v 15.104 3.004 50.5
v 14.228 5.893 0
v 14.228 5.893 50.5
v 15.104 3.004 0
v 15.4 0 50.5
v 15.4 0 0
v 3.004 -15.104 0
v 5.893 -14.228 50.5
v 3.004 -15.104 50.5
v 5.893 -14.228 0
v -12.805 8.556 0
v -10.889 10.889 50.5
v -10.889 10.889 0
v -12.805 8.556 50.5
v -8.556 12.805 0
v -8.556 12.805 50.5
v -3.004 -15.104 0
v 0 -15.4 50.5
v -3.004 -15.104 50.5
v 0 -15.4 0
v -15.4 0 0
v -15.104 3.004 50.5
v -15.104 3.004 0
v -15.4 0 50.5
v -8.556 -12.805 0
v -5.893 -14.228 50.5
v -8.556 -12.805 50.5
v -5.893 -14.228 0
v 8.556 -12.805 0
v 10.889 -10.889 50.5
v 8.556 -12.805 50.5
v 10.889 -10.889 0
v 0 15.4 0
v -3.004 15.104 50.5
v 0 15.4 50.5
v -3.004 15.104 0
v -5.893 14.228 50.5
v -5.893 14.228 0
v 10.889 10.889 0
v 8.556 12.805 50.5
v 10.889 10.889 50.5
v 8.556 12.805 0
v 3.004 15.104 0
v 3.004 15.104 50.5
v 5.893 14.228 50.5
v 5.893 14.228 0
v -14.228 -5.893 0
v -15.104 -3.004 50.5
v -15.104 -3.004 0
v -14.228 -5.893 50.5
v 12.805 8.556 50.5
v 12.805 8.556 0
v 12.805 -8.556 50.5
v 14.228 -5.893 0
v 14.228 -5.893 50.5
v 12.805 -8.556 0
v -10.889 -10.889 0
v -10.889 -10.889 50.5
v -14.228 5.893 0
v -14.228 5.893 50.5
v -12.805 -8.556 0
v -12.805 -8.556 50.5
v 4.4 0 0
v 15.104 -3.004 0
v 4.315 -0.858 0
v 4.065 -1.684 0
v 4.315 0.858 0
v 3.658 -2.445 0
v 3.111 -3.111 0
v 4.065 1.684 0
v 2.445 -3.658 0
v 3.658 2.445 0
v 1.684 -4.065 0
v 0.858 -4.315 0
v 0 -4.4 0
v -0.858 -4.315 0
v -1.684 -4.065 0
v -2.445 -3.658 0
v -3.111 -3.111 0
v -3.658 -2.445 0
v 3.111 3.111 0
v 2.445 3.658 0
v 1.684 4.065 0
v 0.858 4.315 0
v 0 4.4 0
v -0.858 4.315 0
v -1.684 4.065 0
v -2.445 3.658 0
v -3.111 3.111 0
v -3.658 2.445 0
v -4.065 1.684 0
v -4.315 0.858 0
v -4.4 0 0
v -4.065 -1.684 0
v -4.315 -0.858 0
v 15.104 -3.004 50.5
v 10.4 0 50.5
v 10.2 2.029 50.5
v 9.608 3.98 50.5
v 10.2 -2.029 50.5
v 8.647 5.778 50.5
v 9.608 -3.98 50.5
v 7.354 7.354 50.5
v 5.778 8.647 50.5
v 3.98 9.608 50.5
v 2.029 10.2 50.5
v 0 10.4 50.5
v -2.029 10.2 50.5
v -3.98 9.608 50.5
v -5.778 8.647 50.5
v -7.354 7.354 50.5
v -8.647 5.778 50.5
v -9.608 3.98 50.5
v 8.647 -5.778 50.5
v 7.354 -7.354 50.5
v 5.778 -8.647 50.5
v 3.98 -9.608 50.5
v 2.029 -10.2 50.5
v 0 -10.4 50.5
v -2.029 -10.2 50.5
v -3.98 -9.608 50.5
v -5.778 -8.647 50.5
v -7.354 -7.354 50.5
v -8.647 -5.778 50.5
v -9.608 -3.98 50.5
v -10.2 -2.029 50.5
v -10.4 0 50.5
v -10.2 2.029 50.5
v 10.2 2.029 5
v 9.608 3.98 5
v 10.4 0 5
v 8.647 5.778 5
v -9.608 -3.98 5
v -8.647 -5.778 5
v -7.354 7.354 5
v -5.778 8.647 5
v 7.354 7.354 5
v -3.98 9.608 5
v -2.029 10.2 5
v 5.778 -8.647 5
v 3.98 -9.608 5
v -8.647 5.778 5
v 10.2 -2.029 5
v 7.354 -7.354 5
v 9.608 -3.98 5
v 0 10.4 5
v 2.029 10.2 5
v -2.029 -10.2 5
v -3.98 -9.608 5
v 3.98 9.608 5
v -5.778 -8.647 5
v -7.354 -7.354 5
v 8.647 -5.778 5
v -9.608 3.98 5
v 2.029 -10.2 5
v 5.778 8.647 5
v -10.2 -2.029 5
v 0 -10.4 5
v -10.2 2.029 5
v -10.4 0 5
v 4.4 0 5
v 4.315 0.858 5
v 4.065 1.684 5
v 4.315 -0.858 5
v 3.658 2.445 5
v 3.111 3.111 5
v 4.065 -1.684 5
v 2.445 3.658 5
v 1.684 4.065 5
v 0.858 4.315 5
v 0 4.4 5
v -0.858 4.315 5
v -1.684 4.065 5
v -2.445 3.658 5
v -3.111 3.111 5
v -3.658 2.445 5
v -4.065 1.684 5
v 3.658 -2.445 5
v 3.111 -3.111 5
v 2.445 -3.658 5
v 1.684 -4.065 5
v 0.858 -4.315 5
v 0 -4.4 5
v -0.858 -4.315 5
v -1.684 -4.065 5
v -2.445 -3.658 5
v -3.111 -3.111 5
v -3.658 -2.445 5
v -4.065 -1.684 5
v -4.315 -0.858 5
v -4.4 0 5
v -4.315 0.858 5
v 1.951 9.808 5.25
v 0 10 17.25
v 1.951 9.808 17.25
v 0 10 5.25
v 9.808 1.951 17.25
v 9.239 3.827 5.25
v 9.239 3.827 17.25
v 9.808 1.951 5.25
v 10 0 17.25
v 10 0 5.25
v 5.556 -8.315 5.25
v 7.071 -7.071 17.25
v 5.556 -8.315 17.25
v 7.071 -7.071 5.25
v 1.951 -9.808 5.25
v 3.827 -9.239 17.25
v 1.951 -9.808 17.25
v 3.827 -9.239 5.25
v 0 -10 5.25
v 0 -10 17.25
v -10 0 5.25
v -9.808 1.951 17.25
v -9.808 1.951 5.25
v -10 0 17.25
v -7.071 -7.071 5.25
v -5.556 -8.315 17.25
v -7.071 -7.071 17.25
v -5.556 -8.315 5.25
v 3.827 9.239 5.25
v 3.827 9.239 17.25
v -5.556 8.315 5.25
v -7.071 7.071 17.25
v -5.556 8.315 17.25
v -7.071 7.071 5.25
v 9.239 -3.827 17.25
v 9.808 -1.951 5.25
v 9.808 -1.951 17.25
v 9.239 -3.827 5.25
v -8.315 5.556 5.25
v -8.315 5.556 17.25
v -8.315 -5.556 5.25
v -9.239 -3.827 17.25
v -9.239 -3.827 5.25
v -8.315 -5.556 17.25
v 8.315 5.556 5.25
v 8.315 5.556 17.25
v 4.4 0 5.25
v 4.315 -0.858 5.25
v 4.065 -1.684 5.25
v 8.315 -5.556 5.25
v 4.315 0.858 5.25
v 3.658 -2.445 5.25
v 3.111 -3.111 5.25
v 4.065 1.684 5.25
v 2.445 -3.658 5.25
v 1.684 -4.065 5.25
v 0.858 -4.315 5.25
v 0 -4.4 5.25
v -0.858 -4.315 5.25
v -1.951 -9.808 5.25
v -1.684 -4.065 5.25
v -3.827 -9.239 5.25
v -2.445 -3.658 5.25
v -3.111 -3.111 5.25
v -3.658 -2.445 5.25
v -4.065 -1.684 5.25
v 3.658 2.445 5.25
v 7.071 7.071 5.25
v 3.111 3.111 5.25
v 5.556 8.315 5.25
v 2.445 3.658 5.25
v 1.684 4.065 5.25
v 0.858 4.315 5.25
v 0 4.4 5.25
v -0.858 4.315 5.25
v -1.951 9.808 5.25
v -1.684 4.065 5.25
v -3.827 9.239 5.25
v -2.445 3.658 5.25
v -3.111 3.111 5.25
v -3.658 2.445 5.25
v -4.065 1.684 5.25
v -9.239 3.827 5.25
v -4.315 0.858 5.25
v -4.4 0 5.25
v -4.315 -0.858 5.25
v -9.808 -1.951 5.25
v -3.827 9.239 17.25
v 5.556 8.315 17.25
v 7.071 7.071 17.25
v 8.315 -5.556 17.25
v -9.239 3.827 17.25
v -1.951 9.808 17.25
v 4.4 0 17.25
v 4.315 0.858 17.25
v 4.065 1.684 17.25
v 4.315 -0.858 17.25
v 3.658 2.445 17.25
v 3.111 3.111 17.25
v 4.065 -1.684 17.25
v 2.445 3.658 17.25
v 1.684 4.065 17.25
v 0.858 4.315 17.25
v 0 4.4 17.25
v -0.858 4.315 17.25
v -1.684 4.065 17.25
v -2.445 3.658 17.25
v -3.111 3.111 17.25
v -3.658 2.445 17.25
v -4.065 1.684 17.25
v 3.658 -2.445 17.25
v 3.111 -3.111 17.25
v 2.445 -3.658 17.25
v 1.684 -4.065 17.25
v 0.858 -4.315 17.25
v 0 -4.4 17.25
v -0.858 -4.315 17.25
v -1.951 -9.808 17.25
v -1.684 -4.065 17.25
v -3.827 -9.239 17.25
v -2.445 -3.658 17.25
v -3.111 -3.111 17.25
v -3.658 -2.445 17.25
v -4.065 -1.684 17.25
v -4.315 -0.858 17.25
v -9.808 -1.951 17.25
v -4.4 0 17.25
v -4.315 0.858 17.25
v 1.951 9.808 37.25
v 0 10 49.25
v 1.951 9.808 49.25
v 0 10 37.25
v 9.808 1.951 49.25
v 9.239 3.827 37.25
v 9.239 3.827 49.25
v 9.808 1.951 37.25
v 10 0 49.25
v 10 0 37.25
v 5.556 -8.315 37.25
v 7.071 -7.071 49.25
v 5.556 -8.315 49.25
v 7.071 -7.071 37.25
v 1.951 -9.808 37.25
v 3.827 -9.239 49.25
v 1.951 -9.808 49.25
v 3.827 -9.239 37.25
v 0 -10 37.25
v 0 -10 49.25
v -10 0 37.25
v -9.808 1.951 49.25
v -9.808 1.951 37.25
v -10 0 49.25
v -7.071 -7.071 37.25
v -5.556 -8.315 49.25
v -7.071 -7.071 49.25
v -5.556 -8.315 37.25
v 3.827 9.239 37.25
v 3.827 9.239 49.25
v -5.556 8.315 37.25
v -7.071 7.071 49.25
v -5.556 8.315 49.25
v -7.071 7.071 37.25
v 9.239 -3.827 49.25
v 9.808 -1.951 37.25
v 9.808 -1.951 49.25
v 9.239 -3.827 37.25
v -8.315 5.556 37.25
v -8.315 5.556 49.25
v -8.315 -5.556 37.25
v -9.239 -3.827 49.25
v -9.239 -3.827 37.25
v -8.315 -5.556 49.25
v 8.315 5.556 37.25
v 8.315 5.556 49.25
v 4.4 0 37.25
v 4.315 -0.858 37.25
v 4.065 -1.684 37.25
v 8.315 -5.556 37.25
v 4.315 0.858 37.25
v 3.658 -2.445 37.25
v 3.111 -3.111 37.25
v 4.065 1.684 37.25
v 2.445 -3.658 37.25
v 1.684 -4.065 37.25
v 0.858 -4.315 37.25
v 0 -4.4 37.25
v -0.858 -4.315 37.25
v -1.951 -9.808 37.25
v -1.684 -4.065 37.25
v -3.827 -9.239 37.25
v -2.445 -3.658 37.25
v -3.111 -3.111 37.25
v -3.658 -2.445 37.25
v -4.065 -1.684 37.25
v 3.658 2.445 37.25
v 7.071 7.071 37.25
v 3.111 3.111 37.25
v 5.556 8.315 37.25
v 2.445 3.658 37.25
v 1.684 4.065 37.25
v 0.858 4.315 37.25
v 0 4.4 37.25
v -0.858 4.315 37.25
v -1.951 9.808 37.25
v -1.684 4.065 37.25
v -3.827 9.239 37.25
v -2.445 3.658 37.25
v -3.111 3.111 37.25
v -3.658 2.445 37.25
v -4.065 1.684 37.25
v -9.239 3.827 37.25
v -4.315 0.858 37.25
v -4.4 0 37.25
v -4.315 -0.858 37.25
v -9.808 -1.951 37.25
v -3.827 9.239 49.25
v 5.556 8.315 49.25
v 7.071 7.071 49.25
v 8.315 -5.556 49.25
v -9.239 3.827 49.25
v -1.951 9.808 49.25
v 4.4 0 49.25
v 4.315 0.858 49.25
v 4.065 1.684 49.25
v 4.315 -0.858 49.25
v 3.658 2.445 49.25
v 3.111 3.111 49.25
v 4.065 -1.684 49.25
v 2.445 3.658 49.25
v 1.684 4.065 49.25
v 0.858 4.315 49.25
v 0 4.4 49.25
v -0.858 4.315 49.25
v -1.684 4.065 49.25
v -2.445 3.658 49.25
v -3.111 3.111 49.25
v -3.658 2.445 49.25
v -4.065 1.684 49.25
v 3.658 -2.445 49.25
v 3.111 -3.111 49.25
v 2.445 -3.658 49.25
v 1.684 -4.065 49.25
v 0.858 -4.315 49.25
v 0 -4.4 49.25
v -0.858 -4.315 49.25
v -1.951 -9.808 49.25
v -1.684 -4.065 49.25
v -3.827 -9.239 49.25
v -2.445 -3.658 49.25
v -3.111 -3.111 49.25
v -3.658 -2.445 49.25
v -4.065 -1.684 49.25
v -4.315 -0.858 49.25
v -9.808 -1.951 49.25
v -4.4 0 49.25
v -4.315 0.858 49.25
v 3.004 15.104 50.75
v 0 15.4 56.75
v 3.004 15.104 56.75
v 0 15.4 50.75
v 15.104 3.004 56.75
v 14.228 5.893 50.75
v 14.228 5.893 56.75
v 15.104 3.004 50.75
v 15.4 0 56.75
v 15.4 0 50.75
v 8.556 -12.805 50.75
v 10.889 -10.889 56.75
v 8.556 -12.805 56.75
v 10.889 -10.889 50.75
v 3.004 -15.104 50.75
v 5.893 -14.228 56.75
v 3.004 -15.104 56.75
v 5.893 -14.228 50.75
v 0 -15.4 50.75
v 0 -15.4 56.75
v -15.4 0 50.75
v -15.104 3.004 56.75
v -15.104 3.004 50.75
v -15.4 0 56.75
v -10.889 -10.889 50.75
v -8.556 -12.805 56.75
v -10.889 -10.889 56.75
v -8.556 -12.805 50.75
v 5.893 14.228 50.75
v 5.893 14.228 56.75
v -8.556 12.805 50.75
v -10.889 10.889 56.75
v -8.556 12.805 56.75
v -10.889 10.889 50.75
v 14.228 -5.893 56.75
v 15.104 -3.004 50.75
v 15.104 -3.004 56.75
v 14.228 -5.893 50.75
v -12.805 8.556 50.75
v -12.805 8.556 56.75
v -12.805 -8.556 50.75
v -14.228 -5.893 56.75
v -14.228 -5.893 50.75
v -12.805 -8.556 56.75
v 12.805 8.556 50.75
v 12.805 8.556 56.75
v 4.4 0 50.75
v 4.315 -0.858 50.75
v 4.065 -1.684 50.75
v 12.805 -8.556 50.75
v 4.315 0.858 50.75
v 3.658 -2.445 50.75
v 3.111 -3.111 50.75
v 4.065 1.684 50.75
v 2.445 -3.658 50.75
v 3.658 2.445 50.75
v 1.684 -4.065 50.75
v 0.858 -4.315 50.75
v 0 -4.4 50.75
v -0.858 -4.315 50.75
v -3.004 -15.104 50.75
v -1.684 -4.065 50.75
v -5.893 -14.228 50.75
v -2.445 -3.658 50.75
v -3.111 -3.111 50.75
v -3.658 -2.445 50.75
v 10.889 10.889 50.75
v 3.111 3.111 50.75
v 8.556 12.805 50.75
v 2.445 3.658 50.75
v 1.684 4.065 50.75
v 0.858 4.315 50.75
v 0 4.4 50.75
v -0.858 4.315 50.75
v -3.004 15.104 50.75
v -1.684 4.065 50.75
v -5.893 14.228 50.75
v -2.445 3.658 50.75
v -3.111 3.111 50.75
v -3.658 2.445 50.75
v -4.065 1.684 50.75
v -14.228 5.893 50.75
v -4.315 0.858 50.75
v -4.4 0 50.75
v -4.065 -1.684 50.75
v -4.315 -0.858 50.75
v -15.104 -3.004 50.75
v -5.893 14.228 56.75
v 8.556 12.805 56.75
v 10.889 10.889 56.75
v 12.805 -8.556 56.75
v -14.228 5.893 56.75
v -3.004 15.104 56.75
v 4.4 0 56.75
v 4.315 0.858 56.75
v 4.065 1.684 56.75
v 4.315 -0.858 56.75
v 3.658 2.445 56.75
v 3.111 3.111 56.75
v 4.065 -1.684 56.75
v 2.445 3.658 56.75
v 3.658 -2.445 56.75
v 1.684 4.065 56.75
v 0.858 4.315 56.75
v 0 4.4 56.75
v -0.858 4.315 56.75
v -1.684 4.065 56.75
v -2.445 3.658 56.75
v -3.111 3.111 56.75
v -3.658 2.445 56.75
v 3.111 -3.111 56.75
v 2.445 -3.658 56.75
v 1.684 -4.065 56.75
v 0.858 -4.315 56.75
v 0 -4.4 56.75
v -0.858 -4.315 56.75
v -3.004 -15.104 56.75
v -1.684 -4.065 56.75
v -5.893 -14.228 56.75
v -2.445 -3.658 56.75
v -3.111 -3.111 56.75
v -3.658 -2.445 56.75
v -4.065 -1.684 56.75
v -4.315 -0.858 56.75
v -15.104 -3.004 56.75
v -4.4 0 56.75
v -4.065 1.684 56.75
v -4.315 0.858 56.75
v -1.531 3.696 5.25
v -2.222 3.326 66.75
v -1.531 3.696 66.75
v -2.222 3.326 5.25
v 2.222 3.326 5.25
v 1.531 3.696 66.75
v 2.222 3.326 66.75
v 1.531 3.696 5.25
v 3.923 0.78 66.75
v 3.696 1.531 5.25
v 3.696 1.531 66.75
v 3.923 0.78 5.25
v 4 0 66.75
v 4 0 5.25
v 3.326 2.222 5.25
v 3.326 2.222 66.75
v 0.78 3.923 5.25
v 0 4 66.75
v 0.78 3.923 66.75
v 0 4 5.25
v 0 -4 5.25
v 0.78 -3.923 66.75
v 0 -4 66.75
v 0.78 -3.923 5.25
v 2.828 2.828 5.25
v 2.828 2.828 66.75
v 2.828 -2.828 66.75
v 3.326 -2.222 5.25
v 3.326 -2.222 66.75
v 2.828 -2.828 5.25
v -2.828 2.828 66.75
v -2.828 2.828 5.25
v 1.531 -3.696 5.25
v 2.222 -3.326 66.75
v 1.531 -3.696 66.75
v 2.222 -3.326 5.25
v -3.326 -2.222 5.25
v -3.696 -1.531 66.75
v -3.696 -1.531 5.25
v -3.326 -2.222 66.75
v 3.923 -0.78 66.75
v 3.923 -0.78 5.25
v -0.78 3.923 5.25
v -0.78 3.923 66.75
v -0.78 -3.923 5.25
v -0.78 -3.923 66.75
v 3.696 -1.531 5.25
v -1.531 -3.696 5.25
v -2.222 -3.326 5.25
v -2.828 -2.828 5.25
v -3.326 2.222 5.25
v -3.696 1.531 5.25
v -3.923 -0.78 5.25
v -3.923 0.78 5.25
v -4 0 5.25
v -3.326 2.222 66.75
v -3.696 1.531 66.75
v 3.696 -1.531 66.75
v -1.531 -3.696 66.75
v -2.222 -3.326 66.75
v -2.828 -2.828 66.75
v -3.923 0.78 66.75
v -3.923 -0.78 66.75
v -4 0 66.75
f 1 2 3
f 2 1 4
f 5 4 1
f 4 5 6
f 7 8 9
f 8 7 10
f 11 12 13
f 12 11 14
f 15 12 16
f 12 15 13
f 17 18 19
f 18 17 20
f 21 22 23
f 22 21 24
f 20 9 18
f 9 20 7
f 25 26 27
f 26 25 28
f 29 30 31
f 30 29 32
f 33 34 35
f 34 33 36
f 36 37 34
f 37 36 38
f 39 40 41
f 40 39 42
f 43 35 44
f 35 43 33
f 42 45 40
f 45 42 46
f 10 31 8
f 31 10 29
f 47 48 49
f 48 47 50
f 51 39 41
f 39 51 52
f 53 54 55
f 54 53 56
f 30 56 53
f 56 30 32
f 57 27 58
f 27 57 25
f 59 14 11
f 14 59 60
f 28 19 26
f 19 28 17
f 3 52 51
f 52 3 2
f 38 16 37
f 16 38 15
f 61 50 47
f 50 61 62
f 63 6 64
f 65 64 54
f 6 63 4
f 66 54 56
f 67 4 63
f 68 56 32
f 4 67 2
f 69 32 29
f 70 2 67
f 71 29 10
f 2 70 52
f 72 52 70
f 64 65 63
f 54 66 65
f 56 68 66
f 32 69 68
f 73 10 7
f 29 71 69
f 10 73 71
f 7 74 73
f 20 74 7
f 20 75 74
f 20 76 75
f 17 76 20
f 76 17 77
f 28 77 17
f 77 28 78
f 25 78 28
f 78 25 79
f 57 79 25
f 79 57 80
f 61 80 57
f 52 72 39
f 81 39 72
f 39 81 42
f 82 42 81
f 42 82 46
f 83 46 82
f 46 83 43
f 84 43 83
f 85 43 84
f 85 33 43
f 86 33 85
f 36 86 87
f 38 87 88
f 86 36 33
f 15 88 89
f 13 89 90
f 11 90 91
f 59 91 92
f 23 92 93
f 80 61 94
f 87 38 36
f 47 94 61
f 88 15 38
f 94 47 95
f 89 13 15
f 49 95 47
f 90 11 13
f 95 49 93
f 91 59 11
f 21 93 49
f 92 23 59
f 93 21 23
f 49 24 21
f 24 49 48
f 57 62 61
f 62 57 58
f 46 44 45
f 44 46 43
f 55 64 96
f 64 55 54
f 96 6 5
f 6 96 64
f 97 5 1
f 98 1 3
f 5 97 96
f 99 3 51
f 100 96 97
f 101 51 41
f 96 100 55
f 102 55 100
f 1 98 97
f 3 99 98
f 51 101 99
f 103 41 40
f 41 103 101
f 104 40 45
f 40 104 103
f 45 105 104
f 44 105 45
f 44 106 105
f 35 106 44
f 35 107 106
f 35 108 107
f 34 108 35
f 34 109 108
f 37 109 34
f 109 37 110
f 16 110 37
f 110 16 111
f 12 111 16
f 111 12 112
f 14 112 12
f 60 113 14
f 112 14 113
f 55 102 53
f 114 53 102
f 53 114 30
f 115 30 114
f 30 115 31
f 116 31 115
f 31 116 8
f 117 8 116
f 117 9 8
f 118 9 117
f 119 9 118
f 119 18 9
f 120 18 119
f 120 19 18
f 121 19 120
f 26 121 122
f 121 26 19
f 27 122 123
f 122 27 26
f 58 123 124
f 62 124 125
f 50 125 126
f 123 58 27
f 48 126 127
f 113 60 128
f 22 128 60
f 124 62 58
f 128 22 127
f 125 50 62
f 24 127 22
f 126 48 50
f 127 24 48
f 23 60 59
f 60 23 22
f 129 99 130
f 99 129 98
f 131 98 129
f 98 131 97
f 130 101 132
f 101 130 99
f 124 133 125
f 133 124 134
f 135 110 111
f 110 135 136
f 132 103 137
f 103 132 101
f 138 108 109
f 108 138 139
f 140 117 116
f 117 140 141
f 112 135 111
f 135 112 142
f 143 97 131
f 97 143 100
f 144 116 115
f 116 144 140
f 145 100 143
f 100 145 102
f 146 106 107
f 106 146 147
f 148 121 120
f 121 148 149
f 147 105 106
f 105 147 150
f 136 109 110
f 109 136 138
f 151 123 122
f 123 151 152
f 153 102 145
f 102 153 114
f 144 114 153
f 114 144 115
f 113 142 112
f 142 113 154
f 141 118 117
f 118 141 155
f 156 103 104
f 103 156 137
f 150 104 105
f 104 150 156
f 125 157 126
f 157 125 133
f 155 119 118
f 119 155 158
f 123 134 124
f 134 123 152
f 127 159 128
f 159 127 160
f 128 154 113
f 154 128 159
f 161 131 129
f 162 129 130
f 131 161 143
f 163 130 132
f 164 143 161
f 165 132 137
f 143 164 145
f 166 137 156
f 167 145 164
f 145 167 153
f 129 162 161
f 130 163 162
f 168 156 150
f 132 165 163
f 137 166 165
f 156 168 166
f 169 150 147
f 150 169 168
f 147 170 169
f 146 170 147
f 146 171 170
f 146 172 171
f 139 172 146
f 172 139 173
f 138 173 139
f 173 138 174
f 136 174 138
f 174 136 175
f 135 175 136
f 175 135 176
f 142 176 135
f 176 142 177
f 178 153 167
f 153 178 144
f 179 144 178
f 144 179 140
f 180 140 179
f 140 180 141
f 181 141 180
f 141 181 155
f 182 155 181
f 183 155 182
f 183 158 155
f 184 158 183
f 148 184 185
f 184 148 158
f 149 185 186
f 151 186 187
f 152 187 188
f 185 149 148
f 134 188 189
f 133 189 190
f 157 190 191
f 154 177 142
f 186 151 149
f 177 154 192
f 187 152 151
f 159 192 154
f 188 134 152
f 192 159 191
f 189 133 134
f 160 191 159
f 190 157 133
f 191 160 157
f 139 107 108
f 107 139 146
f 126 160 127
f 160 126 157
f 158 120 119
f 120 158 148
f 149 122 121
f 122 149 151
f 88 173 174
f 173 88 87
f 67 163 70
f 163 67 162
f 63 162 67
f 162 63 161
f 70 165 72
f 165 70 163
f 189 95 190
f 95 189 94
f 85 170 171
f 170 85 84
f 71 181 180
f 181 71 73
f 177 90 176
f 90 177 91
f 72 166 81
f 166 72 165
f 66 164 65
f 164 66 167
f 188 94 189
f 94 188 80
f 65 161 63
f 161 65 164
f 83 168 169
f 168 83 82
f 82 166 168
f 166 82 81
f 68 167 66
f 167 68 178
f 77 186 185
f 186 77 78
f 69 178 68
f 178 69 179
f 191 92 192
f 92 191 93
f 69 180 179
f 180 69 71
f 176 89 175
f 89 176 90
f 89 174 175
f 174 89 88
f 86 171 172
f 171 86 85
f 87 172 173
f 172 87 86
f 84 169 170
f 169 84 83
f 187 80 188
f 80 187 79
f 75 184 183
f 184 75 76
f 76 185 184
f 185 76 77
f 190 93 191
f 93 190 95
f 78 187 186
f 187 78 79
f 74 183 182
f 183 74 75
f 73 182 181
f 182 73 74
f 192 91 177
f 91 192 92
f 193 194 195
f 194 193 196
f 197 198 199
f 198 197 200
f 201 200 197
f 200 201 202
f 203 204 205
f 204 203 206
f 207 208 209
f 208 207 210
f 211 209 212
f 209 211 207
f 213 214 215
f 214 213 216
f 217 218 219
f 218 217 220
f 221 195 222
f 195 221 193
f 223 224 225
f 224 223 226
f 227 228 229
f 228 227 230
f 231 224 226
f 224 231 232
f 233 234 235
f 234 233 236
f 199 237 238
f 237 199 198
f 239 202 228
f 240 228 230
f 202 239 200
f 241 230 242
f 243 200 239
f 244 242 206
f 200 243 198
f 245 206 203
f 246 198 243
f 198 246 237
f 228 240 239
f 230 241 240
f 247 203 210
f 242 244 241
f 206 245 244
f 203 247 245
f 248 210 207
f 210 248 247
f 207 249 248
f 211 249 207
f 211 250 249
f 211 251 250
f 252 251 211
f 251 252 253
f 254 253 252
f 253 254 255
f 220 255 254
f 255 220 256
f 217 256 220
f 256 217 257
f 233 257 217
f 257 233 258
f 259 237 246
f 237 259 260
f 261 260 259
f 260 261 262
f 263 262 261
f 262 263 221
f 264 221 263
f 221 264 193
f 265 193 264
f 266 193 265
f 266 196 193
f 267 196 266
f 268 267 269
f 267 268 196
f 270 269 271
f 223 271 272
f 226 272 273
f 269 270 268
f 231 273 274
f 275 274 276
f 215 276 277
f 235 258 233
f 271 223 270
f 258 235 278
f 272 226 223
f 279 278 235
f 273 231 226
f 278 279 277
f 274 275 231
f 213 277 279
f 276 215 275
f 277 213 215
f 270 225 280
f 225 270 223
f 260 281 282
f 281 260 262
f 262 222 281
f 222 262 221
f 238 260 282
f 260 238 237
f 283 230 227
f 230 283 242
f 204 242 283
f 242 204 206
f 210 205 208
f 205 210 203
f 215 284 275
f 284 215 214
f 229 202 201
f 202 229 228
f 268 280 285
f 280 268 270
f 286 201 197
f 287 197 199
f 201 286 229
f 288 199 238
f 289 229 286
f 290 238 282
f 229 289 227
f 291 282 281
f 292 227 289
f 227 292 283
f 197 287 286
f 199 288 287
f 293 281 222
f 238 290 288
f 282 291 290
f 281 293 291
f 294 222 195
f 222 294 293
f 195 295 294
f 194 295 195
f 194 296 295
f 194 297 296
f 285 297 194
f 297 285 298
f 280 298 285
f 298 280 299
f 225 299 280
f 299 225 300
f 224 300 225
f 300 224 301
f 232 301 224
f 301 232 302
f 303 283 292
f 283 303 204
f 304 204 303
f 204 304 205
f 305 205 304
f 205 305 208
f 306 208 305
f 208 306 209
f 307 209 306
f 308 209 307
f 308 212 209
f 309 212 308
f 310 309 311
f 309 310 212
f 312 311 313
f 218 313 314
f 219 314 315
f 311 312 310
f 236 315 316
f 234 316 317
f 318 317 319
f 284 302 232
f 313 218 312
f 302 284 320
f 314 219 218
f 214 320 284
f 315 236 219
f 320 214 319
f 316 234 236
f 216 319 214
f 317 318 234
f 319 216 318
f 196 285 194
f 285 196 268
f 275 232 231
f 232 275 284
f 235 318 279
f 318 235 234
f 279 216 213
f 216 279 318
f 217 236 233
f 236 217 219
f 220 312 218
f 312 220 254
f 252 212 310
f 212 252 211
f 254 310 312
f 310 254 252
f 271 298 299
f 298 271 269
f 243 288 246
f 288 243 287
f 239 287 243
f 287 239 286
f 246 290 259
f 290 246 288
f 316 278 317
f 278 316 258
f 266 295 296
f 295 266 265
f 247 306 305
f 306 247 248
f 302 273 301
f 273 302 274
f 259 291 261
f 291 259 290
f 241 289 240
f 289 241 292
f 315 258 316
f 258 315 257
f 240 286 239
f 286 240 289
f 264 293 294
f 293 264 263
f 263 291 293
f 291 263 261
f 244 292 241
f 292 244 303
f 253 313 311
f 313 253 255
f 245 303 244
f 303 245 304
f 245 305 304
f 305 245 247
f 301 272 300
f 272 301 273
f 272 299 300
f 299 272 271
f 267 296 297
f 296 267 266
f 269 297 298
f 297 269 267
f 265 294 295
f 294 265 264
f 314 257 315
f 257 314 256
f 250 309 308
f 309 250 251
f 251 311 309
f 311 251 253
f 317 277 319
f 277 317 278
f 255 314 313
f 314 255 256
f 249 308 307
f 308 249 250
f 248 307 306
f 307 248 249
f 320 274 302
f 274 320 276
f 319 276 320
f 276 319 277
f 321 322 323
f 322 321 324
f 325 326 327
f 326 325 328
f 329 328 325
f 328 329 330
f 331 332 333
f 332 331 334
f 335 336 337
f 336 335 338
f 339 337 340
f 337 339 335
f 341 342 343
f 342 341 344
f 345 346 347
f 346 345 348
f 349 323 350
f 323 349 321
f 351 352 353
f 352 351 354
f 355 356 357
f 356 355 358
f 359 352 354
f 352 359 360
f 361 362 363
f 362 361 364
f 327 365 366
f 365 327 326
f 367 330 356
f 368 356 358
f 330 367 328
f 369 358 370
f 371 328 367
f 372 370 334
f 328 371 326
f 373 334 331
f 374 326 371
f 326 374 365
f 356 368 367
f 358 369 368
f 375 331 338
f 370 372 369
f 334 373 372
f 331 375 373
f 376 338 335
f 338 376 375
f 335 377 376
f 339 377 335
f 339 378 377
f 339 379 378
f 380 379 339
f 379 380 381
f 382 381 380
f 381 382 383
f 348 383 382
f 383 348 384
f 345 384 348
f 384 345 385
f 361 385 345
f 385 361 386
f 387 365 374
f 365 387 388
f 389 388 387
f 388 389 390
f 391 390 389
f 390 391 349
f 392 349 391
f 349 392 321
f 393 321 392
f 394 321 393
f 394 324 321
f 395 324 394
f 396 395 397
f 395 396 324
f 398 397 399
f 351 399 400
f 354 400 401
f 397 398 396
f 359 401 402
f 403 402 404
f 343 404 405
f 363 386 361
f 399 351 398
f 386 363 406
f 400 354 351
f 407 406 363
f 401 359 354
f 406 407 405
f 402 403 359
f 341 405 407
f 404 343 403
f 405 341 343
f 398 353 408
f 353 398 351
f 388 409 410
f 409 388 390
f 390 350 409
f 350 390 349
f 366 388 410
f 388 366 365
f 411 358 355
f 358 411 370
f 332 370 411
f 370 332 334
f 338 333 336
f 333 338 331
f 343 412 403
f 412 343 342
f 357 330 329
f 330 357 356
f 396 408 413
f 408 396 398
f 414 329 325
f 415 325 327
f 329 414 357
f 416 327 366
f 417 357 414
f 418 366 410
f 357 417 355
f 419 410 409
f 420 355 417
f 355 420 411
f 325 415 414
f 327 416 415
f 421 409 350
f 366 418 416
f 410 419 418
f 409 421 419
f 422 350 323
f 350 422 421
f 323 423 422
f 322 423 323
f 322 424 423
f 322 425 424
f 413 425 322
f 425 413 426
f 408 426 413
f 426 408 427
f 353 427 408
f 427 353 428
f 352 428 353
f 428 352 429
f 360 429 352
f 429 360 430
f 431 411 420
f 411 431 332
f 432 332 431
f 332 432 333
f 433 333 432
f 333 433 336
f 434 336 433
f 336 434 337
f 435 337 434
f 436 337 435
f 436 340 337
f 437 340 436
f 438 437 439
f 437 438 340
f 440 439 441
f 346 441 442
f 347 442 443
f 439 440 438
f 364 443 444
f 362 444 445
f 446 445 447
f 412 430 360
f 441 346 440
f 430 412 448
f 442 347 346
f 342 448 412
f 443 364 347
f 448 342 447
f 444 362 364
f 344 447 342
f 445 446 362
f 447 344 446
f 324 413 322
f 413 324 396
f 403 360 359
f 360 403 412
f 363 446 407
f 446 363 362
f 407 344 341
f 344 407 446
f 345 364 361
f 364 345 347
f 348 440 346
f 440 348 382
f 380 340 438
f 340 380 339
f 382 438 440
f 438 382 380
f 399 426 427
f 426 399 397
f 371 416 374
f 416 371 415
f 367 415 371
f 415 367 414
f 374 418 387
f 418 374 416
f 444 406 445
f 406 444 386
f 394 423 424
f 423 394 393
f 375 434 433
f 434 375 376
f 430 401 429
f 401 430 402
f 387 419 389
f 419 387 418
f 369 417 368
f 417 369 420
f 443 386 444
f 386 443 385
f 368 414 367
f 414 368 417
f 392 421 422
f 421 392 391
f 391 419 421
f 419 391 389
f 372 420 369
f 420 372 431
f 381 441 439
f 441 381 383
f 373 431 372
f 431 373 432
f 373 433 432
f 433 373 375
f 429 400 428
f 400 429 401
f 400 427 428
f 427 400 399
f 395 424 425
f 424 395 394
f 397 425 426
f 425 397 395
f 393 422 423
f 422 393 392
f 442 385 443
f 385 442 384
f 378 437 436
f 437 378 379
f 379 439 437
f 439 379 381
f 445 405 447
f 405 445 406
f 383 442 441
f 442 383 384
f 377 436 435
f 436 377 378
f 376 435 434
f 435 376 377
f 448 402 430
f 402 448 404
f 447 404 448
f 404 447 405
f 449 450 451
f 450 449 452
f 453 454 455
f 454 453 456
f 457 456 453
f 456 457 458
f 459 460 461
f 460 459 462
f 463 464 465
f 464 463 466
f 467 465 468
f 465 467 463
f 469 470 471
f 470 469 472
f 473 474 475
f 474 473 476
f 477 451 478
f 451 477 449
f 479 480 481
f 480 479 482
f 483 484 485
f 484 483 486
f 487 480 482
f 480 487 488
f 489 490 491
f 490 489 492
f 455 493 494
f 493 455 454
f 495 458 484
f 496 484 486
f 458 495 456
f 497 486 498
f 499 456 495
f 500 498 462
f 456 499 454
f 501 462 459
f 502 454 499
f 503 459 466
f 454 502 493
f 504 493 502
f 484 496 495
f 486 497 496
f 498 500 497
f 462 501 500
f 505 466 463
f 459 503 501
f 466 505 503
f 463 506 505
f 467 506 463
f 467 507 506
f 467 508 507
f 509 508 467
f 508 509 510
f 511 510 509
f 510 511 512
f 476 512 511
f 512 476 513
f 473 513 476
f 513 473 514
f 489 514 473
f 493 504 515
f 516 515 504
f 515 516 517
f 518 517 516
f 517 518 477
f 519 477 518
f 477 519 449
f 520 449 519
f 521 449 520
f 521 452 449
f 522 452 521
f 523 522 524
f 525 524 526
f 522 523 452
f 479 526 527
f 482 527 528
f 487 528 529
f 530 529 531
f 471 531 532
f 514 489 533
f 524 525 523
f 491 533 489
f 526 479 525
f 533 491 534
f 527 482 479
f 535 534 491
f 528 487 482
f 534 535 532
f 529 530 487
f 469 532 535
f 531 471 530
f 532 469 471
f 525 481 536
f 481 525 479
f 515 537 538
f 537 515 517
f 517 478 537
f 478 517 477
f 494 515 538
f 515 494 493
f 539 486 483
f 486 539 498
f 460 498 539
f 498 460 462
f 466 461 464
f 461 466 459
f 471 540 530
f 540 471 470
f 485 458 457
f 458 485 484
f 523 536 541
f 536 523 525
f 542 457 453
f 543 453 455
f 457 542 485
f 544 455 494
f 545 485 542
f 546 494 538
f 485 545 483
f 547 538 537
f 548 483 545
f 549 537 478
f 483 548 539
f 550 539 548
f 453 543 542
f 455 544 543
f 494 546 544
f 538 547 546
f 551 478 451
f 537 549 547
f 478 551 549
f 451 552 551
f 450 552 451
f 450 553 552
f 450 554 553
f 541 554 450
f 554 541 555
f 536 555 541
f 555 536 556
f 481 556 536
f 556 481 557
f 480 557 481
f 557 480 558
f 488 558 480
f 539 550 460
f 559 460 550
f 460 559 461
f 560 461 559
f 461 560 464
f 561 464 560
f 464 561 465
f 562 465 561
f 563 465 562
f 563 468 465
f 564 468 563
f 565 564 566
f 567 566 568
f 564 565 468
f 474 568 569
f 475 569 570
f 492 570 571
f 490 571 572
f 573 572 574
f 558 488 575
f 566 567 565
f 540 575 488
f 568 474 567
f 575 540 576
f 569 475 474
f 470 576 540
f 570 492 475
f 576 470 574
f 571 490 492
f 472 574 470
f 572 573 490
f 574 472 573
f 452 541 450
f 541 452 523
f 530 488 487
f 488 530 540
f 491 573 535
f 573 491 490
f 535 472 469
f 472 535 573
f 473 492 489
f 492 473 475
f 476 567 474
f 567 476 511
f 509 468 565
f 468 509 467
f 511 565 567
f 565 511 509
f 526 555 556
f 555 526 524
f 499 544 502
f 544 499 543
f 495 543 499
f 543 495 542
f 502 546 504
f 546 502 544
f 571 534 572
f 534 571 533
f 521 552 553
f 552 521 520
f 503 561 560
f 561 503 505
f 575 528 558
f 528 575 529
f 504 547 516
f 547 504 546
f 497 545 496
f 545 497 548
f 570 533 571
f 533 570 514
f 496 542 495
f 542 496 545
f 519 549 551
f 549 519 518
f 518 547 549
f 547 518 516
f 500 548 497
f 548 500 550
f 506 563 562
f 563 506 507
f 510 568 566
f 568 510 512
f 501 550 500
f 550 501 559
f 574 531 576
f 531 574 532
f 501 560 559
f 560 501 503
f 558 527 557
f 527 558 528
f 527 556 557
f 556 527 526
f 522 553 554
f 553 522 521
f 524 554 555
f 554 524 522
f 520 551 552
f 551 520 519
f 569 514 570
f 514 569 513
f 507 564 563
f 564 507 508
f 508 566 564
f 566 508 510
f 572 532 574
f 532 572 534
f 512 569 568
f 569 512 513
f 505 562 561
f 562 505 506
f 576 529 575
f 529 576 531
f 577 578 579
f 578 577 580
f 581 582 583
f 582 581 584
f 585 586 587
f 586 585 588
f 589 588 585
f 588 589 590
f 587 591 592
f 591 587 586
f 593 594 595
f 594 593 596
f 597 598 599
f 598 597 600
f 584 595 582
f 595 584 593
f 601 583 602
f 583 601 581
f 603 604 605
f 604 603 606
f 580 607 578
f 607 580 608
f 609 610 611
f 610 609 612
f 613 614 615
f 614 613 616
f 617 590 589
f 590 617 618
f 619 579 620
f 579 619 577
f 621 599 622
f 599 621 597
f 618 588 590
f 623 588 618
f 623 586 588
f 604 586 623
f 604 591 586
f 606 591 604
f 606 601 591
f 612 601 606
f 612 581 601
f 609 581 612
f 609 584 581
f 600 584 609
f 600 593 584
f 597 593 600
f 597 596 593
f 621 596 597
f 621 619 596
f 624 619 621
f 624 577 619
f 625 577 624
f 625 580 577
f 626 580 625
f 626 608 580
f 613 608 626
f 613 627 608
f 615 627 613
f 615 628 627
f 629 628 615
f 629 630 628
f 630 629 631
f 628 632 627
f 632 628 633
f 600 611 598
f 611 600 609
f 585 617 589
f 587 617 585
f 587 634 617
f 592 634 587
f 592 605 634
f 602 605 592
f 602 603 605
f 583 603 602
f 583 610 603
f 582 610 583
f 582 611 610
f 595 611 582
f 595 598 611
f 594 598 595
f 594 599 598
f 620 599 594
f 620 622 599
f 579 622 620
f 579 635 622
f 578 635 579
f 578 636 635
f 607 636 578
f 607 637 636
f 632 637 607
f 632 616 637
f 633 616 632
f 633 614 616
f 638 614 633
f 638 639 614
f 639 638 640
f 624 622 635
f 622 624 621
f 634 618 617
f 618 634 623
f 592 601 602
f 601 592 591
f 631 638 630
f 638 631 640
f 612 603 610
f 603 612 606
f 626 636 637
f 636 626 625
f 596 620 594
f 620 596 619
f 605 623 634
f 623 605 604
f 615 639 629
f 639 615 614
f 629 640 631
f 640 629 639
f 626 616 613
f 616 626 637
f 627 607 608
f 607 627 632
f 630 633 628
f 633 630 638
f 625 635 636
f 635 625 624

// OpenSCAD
$fn = 32;

// ------------------------------------------------------------------------
// Shaft station: cup d30.8 x 50.5 mm, shaft d8
// Every part is its own module, assembly() places every instance.
// ------------------------------------------------------------------------

// --- part 1 ---
module housing_cup() {
  difference() {
    cylinder(h = 50.5, d = 30.8);
    translate([0, 0, 5]) cylinder(h = 46.5, d = 20.8);
    translate([0, 0, -1]) cylinder(h = 7, d = 8.8);
  }
}

// --- part 2 ---
module bearing_lower() {
  difference() {
      translate([0, 0, 0]) cylinder(h = 12, d = 20);
      translate([0, 0, -1]) cylinder(h = 14, d = 8.8);
    }
}

// --- part 3 ---
module bearing_upper() {
  difference() {
      translate([0, 0, 0]) cylinder(h = 12, d = 20);
      translate([0, 0, -1]) cylinder(h = 14, d = 8.8);
    }
}

// --- part 4 ---
module station_shaft() {
  translate([0, 0, -30.75]) cylinder(h = 61.5, d = 8);
}

// --- part 5 ---
module station_cover() {
  difference() {
    cylinder(h = 6, d = 30.8);
    translate([0, 0, -1]) cylinder(h = 8, d = 8.8);
  }
}

// --- assembly ---
module assembly() {
  color([0.80, 0.24, 0.20]) translate([0, 0, 0]) rotate([0, 0, 0]) housing_cup();
  color([0.20, 0.45, 0.75]) translate([0, 0, 5.25]) rotate([0, 0, 0]) bearing_lower();
  color([0.25, 0.62, 0.32]) translate([0, 0, 37.25]) rotate([0, 0, 0]) bearing_upper();
  color([0.92, 0.70, 0.18]) translate([0, 0, 36]) rotate([0, 0, 0]) station_shaft();
  color([0.58, 0.35, 0.70]) translate([0, 0, 50.75]) rotate([0, 0, 0]) station_cover();
}

assembly();
